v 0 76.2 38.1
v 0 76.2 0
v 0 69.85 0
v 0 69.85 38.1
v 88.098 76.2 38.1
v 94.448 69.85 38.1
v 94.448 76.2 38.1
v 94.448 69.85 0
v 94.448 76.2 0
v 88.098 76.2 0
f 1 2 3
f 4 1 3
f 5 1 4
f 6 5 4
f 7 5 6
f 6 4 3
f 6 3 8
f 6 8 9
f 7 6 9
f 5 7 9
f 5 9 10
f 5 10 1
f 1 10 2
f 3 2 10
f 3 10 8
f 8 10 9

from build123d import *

# Parameters (mm, degrees)
BOSS_EXTRUDE1_DEPTH = 38.1
SKETCH2_R           = 11.049
CUT_EXTRUDE1_DEPTH  = 6.35
SKETCH2_4_R         = 3.556
CUT_EXTRUDE2_DEPTH  = 6.35
SKETCH4_W           = 14.244414607
SKETCH4_H           = 36.472405425
SKETCH4_W_2         = 34.84093086
SKETCH4_H_2         = 80.147164796
CUT_EXTRUDE4_DEPTH  = 76.2


with BuildPart() as part:
    # Sketch1 → Boss-Extrude1 (new body)
    with BuildSketch(Plane.XY):
        Polygon((0, 76.2), (0, 0), (6.35, 0), (6.35, 69.85), (94.447991824, 69.85), (94.447991824, 101.6), (88.097991824, 101.6), (88.097991824, 76.2), align=None)
    extrude(amount=BOSS_EXTRUDE1_DEPTH)

    # Sketch2 → Cut-Extrude1 (cut)
    with BuildSketch(Plane.ZY):
        with Locations((19.05, 20.32)):
            Circle(SKETCH2_R)
    extrude(amount=-CUT_EXTRUDE1_DEPTH, mode=Mode.SUBTRACT)

    # Sketch2<4> → Cut-Extrude2 (cut)
    with BuildSketch(Plane.ZY):
        with Locations((19.05, 42.672)):
            Circle(SKETCH2_4_R)
    extrude(amount=-CUT_EXTRUDE2_DEPTH, mode=Mode.SUBTRACT)

    # Sketch4 → Cut-Extrude4 (cut)
    with BuildSketch(Plane.XY.offset(38.1)):
        with Locations((95.220199127, 94.436202713)):
            Rectangle(SKETCH4_W, SKETCH4_H)
        with Locations((-11.07046543, 29.776417602)):
            Rectangle(SKETCH4_W_2, SKETCH4_H_2)
    extrude(amount=-CUT_EXTRUDE4_DEPTH, mode=Mode.SUBTRACT)


solid = part.part
